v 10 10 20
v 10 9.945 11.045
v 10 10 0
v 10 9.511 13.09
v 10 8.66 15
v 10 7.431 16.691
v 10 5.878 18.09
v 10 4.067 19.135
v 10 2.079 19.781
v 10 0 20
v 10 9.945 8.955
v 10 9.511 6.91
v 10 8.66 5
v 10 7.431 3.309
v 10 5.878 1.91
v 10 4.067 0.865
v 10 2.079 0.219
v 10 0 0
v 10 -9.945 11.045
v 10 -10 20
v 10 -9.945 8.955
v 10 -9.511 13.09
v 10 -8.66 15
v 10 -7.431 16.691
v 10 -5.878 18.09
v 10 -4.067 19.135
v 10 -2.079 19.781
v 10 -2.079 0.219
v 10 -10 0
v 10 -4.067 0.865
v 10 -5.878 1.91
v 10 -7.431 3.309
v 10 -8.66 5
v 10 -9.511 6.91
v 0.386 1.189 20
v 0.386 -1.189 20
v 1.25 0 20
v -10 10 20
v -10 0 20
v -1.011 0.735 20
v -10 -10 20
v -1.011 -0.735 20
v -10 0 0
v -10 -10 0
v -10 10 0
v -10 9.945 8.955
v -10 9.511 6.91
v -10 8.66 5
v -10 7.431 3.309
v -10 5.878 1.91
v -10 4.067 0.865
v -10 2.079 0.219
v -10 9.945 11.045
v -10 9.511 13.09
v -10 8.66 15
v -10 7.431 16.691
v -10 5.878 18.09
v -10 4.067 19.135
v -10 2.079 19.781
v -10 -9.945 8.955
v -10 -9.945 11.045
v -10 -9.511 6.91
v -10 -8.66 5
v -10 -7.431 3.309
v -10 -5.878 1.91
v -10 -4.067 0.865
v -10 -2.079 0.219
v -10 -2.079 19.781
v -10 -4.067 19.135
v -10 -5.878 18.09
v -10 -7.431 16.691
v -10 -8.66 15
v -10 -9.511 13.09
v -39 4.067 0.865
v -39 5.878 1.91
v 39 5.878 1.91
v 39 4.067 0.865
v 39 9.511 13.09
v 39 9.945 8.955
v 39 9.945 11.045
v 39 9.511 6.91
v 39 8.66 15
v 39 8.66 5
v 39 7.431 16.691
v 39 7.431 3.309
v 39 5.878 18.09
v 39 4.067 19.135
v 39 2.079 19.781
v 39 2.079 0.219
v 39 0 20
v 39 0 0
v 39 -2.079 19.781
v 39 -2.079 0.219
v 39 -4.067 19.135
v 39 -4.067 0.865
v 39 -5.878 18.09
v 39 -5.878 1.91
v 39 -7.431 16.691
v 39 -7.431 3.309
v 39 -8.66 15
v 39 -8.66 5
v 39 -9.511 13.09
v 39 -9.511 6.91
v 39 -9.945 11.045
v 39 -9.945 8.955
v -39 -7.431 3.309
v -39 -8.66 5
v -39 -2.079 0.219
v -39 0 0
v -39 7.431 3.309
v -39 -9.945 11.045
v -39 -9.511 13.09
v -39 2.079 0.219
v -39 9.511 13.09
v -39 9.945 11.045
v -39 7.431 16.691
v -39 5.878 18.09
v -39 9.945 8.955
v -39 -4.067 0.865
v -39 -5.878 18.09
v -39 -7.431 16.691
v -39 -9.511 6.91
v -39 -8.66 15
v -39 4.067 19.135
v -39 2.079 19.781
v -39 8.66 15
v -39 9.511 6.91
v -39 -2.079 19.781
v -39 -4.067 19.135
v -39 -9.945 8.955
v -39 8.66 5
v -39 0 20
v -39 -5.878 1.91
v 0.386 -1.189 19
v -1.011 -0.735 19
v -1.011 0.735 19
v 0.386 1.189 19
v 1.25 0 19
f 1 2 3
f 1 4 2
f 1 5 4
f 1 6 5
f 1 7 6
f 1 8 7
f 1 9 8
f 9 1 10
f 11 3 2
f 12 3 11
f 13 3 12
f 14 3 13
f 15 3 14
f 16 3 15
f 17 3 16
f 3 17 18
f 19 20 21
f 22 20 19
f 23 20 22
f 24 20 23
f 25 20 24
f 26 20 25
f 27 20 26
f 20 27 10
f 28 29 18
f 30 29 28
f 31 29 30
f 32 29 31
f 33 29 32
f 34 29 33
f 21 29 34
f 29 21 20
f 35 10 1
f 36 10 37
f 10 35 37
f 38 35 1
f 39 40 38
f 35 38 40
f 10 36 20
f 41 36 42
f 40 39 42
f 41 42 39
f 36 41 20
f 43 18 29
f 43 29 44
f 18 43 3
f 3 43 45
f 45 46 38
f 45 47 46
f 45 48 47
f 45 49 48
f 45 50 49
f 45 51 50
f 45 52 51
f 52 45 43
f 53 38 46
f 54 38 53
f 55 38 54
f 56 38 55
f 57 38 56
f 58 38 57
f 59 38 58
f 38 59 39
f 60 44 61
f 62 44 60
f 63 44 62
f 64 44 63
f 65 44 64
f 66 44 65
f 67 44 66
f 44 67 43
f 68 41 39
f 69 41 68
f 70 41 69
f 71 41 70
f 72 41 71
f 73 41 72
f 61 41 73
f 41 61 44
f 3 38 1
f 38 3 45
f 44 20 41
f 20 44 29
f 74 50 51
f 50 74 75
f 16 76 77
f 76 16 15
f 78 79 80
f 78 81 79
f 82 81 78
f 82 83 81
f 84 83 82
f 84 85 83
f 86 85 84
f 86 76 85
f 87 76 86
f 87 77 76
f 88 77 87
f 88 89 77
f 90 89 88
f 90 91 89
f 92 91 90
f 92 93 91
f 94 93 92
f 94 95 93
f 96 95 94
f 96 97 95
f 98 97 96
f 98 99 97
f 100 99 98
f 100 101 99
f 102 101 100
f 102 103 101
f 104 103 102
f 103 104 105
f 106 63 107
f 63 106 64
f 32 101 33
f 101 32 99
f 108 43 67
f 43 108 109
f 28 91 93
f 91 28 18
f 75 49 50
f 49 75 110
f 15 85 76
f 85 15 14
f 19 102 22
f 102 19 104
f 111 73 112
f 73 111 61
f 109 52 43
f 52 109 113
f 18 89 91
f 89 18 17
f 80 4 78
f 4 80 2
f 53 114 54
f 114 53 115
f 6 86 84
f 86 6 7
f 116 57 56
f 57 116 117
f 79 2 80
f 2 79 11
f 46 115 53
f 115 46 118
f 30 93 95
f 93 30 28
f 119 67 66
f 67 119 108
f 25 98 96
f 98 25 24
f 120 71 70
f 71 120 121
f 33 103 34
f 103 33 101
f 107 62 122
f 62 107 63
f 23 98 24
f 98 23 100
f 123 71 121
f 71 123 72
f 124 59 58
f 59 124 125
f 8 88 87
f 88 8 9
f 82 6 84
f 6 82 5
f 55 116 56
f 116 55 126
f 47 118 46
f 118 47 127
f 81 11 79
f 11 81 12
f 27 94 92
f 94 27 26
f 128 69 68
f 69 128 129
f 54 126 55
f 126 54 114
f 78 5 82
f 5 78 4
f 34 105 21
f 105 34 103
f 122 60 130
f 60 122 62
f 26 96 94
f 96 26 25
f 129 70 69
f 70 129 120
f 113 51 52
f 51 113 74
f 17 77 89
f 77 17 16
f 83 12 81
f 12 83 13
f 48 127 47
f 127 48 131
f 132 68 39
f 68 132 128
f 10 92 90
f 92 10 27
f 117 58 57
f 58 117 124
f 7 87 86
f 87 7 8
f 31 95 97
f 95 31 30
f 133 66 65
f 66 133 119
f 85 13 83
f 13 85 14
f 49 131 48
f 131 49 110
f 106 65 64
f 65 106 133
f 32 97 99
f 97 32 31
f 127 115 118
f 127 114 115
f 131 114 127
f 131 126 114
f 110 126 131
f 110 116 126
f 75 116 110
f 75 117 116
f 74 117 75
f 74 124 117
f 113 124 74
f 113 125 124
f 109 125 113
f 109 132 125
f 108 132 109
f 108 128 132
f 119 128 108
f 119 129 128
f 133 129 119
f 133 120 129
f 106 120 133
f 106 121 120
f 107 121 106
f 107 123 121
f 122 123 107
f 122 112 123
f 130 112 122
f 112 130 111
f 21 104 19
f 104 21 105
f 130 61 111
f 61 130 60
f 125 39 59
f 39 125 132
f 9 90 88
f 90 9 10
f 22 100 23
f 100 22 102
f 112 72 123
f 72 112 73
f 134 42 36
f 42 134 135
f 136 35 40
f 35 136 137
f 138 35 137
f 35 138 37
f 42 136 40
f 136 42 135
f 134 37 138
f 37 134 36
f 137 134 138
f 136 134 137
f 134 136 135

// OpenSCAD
cube_size = 20; // [10:Small,20:Medium,30:Large]

hole_diameter = 2.5; 
hole_radius = hole_diameter/2;

// How deep should the center hole be?
hole_depth = 1; // [0,1,5,50]

show_wheels = "yes"; // [yes,no]

// How thick should the side wheels be?
wheel_thickness = 29; // [1:40]

// ignore this variable!
// foo=1;

// don't turn functions into params!
function BEZ03(u) = pow((1-u), 3);

// ignore variable values
bing = 3+4;
baz = 3 / hole_depth;

difference() {
  union() {
    translate([0, 0, cube_size/2]) cube([cube_size,cube_size,cube_size], center=true);
    if (show_wheels == "yes") {
      translate([0, 0, cube_size/2]) rotate([0, 90, 0]) {
        cylinder(r=cube_size/2, h=cube_size+(wheel_thickness*2), center=true);
      }
    }
  }
  translate([0, 0, cube_size-hole_depth]) cylinder(r=hole_radius, h=hole_depth);
}
        
